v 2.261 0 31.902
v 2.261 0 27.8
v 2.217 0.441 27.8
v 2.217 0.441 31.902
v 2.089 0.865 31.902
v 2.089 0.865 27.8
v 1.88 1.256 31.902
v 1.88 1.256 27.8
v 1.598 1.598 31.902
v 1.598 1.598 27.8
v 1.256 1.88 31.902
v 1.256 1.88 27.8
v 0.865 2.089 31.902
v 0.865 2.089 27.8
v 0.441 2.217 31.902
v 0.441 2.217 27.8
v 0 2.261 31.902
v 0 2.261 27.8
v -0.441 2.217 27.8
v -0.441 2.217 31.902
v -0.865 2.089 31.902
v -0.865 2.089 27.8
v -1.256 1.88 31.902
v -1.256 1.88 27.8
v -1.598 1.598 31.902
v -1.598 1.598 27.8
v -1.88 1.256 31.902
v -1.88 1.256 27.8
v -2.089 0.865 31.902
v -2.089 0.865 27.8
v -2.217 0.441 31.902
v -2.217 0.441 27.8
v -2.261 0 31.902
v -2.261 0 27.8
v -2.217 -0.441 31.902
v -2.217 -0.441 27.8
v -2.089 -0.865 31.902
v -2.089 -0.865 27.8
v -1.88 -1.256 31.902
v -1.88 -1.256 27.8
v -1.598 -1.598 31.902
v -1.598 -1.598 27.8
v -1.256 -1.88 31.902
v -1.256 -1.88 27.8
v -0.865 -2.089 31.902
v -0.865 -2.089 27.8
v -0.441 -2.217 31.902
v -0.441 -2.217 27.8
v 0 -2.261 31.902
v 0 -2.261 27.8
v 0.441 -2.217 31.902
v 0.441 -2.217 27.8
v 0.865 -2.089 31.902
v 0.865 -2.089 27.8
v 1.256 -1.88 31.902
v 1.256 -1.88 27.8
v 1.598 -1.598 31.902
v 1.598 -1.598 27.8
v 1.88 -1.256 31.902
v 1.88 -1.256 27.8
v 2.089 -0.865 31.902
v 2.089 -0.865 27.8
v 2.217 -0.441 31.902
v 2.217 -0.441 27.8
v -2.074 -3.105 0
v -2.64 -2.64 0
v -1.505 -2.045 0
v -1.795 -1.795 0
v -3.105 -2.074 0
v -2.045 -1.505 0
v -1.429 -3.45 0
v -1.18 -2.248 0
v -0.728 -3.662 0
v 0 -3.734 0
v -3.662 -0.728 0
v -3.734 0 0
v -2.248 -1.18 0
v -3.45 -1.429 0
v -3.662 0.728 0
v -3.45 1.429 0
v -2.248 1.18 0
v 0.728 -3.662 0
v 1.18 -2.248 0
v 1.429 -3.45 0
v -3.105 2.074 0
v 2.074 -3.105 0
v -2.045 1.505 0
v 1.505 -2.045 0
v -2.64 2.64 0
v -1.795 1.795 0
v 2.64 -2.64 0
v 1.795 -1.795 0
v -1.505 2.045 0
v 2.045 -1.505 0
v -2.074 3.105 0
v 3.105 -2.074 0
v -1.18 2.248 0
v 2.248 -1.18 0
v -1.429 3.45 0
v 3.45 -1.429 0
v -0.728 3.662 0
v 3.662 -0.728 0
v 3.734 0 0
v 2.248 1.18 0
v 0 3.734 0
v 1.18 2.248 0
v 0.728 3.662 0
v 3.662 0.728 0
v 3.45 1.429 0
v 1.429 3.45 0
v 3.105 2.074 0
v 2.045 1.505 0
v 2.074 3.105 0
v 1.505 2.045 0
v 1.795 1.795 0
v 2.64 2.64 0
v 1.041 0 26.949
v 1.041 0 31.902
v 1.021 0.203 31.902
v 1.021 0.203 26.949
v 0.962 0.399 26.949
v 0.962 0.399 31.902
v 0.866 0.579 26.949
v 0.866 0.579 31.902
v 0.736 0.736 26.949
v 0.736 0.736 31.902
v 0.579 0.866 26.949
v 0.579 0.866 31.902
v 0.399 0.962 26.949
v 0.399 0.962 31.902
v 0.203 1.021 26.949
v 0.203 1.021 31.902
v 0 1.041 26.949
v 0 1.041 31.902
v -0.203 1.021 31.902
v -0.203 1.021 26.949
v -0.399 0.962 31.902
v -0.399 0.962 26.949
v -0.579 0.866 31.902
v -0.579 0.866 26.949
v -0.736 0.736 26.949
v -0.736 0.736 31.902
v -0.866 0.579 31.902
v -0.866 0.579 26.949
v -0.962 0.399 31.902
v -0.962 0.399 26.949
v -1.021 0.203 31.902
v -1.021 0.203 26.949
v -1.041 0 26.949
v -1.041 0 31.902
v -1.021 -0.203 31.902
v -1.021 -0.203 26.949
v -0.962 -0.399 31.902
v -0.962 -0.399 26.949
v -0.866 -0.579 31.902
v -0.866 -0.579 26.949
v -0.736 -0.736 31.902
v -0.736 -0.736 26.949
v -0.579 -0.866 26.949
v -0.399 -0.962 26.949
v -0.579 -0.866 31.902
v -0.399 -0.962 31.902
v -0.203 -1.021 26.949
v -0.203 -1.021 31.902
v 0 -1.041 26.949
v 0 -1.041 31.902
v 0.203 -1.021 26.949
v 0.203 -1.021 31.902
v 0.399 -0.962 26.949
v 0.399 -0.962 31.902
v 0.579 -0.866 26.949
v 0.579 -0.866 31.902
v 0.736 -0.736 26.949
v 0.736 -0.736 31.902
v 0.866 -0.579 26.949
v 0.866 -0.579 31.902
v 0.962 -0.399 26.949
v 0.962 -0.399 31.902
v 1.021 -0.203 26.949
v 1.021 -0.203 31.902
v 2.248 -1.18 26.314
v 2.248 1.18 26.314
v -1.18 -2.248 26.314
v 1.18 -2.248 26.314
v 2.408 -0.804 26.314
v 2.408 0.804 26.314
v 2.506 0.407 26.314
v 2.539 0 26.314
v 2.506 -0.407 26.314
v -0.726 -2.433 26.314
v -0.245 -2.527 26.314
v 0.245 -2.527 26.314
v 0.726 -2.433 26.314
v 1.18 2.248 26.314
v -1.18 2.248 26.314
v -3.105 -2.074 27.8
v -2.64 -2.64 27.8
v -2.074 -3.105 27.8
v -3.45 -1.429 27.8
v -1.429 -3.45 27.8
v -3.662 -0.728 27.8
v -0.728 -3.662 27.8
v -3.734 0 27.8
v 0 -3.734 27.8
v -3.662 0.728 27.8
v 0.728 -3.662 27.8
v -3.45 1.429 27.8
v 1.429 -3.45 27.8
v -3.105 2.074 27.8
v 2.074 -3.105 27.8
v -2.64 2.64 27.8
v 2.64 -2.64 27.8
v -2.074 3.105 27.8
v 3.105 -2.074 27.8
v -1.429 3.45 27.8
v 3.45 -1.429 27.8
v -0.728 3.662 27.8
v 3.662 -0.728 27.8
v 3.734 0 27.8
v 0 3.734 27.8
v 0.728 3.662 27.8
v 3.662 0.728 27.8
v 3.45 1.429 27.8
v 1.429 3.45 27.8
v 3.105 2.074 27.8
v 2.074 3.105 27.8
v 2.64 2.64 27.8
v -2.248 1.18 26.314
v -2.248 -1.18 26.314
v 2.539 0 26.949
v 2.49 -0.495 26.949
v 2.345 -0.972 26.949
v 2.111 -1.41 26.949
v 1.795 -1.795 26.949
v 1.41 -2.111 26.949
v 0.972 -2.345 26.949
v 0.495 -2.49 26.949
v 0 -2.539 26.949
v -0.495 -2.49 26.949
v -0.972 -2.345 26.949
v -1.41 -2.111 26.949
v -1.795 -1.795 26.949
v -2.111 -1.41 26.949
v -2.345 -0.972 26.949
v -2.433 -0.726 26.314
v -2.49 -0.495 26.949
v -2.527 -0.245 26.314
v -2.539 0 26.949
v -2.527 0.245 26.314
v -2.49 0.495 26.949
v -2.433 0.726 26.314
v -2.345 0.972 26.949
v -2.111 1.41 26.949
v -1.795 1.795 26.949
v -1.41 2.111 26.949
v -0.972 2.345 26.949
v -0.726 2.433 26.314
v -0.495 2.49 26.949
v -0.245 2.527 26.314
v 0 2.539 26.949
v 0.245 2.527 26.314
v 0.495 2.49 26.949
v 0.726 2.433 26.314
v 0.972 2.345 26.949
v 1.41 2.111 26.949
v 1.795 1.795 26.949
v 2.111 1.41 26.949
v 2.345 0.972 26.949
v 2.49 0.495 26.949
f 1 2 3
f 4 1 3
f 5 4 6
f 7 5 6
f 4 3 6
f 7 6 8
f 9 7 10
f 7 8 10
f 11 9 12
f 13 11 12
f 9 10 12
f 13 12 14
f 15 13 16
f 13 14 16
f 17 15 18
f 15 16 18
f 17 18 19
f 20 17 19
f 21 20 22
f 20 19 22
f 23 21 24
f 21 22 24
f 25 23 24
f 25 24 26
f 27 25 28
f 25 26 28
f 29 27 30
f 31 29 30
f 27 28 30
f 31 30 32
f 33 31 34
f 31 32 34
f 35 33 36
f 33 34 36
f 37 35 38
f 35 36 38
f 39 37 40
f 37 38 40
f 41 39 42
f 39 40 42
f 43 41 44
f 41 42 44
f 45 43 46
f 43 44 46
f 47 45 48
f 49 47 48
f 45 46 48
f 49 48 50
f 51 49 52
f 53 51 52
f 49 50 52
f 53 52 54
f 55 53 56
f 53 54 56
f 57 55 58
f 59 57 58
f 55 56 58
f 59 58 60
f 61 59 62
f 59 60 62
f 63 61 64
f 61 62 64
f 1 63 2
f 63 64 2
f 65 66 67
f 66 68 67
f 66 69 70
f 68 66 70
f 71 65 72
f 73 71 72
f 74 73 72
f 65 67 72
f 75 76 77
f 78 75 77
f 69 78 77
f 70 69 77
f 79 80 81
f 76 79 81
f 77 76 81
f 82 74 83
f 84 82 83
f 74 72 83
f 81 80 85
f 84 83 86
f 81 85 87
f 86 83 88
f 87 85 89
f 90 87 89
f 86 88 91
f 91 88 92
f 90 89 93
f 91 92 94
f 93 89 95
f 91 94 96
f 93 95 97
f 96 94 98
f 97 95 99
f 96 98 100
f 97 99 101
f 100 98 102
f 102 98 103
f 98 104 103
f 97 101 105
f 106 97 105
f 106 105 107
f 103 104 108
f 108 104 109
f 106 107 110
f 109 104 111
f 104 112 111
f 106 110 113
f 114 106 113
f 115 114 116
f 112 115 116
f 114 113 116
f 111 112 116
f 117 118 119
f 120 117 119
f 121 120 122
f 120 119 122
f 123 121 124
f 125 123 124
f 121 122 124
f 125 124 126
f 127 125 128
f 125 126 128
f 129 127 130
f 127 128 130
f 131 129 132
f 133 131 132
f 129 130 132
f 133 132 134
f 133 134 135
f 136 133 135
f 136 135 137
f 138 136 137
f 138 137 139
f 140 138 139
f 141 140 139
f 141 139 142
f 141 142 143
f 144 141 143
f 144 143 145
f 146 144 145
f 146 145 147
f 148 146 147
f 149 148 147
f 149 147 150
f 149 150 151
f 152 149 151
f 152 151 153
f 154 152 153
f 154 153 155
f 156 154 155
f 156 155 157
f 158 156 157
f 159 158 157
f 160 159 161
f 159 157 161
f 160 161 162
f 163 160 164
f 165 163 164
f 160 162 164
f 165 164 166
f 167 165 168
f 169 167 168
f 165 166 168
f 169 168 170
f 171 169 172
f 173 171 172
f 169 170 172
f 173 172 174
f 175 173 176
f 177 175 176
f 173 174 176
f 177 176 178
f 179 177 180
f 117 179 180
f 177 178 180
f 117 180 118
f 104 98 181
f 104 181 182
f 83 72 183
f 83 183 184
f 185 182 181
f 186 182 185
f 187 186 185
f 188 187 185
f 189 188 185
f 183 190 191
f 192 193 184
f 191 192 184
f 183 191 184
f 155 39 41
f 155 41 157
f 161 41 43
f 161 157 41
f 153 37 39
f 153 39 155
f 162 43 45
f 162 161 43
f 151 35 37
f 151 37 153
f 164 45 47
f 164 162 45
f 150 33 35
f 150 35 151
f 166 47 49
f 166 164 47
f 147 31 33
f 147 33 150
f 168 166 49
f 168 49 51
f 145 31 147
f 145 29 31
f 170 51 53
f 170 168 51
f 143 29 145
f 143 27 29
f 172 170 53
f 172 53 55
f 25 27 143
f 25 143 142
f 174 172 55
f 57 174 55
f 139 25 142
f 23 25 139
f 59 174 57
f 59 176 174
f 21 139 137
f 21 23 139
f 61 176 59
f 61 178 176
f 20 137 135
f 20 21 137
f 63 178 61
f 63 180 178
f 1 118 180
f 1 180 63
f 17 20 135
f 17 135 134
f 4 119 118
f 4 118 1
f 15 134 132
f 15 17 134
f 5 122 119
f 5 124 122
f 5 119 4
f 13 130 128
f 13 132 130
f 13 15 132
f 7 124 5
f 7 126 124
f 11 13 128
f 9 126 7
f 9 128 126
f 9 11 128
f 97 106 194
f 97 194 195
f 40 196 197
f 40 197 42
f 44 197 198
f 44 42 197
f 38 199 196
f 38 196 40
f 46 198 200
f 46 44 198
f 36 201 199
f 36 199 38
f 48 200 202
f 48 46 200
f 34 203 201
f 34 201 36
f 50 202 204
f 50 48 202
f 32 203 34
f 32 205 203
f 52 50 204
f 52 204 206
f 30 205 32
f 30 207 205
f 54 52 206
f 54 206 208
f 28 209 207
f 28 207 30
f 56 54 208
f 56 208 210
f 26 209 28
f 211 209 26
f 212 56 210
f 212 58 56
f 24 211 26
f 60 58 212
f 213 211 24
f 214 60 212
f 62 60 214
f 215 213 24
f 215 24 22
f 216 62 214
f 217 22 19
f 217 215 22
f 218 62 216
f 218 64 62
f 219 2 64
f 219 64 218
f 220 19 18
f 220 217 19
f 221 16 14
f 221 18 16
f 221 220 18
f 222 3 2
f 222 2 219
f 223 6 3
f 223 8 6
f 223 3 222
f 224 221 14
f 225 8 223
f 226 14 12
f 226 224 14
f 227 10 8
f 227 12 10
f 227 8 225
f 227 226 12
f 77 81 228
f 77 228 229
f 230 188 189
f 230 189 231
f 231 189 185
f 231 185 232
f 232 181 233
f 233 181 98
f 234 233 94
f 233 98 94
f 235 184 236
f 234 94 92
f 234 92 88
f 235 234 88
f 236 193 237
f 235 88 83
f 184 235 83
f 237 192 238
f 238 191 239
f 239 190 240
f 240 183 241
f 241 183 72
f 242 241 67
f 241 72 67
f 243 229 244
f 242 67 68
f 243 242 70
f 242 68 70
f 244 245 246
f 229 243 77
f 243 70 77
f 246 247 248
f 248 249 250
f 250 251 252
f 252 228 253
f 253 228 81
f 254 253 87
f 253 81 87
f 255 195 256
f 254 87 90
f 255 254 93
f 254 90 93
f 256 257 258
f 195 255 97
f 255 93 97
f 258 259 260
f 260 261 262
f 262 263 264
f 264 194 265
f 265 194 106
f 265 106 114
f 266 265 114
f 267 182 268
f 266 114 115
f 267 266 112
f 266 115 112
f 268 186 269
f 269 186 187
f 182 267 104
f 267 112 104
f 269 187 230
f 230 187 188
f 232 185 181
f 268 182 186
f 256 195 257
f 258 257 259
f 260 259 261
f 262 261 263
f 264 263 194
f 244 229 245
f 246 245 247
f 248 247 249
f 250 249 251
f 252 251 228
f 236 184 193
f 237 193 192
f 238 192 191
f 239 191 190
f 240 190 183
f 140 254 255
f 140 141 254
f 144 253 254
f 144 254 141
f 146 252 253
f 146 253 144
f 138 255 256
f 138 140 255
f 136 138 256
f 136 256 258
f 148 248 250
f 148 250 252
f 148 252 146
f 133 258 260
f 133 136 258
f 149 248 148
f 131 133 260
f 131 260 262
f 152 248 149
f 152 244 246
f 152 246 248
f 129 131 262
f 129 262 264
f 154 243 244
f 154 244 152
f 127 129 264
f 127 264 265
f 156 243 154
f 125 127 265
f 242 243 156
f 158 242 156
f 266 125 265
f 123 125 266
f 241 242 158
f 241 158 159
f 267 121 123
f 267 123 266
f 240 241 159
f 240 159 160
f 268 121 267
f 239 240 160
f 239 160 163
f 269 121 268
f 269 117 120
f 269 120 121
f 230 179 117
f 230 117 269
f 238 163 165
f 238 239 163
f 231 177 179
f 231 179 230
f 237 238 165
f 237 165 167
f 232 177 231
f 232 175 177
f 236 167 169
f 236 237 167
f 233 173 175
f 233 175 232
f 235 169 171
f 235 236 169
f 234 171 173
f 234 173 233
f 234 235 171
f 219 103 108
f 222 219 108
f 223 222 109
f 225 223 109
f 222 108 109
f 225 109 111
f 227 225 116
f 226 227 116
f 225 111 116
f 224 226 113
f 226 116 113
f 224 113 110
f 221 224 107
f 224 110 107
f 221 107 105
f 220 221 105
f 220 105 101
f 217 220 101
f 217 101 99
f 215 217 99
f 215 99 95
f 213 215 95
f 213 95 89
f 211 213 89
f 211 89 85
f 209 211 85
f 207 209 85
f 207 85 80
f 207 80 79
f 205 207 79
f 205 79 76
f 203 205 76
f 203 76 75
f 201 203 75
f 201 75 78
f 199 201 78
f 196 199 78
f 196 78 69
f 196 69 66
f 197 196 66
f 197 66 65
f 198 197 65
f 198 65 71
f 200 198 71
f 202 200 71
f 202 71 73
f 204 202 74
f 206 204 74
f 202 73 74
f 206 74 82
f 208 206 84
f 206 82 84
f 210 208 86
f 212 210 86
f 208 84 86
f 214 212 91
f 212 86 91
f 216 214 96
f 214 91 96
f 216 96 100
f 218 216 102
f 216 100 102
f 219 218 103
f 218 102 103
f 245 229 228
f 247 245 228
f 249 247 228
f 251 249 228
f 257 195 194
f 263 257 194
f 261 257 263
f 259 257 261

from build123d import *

# Parameters (mm, degrees)
F0_R     = 3.7338
F1_DEPTH = 27.8003
F2_R     = 2.2606
F3_DEPTH = 4.1021
F4_R     = 1.0414
F5_DEPTH = 47.0154
F6_R     = 2.53873
F7_DEPTH = 26.9494
F8_R     = 3.7338
F9_DEPTH = 26.3144


with BuildPart() as f1:
    # F0 (on Top) → F1 (new body)
    with BuildSketch(Plane.XY):
        Circle(F0_R)
    extrude(amount=F1_DEPTH)

    # F2 (on face) → F3 (join)
    with BuildSketch(Plane.XY.offset(27.8003)):
        Circle(F2_R)
    extrude(amount=F3_DEPTH)

    # F4 (on face) → F5 (cut)
    with BuildSketch(Plane.XY.offset(31.9024)):
        Circle(F4_R)
    extrude(amount=-F5_DEPTH, mode=Mode.SUBTRACT)

    # F6 (on face) → F7 (cut)
    with BuildSketch(Plane(origin=(0, 0, 0), x_dir=(1, 0, 0), z_dir=(0, 0, -1))):
        Circle(F6_R)
    extrude(amount=-F7_DEPTH, mode=Mode.SUBTRACT)

    # F8 (on face) → F9 (join)
    with BuildSketch(Plane(origin=(0, 0, 0), x_dir=(1, 0, 0), z_dir=(0, 0, -1))):
        Circle(F8_R)
        with BuildLine():
            Line((1.1798710111, 2.2479), (2.2479, 2.2479))
            Line((2.2479, 2.2479), (2.2479, 1.1798710111))
            ThreePointArc((2.2479, 1.1798710111), (2.4649504234, 0.6075931393), (2.53873, 0))
            ThreePointArc((2.53873, 0), (2.4649504234, -0.6075931393), (2.2479, -1.1798710111))
            Line((2.2479, -1.1798710111), (2.2479, -2.2479))
            Line((2.2479, -2.2479), (1.1798710111, -2.2479))
            ThreePointArc((1.1798710111, -2.2479), (0, -2.53873), (-1.1798710111, -2.2479))
            Line((-1.1798710111, -2.2479), (-2.2479, -2.2479))
            Line((-2.2479, -2.2479), (-2.2479, -1.1798710111))
            ThreePointArc((-2.2479, -1.1798710111), (-2.53873, 0), (-2.2479, 1.1798710111))
            Line((-2.2479, 1.1798710111), (-2.2479, 2.2479))
            Line((-2.2479, 2.2479), (-1.1798710111, 2.2479))
            ThreePointArc((-1.1798710111, 2.2479), (0, 2.53873), (1.1798710111, 2.2479))
        make_face(mode=Mode.SUBTRACT)
        with BuildLine():
            Line((-1.1798710111, 2.2479), (1.1798710111, 2.2479))
            ThreePointArc((1.1798710111, 2.2479), (0, 2.53873), (-1.1798710111, 2.2479))
        make_face()
        with BuildLine():
            ThreePointArc((2.53873, 0), (2.4649504234, 0.6075931393), (2.2479, 1.1798710111))
            Line((2.2479, 1.1798710111), (2.2479, -1.1798710111))
            ThreePointArc((2.2479, -1.1798710111), (2.4649504234, -0.6075931393), (2.53873, 0))
        make_face()
        with BuildLine():
            Line((-2.2479, -1.1798710111), (-2.2479, 1.1798710111))
            ThreePointArc((-2.2479, 1.1798710111), (-2.53873, 0), (-2.2479, -1.1798710111))
        make_face()
        with BuildLine():
            ThreePointArc((-1.1798710111, -2.2479), (0, -2.53873), (1.1798710111, -2.2479))
            Line((1.1798710111, -2.2479), (-1.1798710111, -2.2479))
        make_face()
    extrude(amount=-F9_DEPTH)


solid = f1.part
